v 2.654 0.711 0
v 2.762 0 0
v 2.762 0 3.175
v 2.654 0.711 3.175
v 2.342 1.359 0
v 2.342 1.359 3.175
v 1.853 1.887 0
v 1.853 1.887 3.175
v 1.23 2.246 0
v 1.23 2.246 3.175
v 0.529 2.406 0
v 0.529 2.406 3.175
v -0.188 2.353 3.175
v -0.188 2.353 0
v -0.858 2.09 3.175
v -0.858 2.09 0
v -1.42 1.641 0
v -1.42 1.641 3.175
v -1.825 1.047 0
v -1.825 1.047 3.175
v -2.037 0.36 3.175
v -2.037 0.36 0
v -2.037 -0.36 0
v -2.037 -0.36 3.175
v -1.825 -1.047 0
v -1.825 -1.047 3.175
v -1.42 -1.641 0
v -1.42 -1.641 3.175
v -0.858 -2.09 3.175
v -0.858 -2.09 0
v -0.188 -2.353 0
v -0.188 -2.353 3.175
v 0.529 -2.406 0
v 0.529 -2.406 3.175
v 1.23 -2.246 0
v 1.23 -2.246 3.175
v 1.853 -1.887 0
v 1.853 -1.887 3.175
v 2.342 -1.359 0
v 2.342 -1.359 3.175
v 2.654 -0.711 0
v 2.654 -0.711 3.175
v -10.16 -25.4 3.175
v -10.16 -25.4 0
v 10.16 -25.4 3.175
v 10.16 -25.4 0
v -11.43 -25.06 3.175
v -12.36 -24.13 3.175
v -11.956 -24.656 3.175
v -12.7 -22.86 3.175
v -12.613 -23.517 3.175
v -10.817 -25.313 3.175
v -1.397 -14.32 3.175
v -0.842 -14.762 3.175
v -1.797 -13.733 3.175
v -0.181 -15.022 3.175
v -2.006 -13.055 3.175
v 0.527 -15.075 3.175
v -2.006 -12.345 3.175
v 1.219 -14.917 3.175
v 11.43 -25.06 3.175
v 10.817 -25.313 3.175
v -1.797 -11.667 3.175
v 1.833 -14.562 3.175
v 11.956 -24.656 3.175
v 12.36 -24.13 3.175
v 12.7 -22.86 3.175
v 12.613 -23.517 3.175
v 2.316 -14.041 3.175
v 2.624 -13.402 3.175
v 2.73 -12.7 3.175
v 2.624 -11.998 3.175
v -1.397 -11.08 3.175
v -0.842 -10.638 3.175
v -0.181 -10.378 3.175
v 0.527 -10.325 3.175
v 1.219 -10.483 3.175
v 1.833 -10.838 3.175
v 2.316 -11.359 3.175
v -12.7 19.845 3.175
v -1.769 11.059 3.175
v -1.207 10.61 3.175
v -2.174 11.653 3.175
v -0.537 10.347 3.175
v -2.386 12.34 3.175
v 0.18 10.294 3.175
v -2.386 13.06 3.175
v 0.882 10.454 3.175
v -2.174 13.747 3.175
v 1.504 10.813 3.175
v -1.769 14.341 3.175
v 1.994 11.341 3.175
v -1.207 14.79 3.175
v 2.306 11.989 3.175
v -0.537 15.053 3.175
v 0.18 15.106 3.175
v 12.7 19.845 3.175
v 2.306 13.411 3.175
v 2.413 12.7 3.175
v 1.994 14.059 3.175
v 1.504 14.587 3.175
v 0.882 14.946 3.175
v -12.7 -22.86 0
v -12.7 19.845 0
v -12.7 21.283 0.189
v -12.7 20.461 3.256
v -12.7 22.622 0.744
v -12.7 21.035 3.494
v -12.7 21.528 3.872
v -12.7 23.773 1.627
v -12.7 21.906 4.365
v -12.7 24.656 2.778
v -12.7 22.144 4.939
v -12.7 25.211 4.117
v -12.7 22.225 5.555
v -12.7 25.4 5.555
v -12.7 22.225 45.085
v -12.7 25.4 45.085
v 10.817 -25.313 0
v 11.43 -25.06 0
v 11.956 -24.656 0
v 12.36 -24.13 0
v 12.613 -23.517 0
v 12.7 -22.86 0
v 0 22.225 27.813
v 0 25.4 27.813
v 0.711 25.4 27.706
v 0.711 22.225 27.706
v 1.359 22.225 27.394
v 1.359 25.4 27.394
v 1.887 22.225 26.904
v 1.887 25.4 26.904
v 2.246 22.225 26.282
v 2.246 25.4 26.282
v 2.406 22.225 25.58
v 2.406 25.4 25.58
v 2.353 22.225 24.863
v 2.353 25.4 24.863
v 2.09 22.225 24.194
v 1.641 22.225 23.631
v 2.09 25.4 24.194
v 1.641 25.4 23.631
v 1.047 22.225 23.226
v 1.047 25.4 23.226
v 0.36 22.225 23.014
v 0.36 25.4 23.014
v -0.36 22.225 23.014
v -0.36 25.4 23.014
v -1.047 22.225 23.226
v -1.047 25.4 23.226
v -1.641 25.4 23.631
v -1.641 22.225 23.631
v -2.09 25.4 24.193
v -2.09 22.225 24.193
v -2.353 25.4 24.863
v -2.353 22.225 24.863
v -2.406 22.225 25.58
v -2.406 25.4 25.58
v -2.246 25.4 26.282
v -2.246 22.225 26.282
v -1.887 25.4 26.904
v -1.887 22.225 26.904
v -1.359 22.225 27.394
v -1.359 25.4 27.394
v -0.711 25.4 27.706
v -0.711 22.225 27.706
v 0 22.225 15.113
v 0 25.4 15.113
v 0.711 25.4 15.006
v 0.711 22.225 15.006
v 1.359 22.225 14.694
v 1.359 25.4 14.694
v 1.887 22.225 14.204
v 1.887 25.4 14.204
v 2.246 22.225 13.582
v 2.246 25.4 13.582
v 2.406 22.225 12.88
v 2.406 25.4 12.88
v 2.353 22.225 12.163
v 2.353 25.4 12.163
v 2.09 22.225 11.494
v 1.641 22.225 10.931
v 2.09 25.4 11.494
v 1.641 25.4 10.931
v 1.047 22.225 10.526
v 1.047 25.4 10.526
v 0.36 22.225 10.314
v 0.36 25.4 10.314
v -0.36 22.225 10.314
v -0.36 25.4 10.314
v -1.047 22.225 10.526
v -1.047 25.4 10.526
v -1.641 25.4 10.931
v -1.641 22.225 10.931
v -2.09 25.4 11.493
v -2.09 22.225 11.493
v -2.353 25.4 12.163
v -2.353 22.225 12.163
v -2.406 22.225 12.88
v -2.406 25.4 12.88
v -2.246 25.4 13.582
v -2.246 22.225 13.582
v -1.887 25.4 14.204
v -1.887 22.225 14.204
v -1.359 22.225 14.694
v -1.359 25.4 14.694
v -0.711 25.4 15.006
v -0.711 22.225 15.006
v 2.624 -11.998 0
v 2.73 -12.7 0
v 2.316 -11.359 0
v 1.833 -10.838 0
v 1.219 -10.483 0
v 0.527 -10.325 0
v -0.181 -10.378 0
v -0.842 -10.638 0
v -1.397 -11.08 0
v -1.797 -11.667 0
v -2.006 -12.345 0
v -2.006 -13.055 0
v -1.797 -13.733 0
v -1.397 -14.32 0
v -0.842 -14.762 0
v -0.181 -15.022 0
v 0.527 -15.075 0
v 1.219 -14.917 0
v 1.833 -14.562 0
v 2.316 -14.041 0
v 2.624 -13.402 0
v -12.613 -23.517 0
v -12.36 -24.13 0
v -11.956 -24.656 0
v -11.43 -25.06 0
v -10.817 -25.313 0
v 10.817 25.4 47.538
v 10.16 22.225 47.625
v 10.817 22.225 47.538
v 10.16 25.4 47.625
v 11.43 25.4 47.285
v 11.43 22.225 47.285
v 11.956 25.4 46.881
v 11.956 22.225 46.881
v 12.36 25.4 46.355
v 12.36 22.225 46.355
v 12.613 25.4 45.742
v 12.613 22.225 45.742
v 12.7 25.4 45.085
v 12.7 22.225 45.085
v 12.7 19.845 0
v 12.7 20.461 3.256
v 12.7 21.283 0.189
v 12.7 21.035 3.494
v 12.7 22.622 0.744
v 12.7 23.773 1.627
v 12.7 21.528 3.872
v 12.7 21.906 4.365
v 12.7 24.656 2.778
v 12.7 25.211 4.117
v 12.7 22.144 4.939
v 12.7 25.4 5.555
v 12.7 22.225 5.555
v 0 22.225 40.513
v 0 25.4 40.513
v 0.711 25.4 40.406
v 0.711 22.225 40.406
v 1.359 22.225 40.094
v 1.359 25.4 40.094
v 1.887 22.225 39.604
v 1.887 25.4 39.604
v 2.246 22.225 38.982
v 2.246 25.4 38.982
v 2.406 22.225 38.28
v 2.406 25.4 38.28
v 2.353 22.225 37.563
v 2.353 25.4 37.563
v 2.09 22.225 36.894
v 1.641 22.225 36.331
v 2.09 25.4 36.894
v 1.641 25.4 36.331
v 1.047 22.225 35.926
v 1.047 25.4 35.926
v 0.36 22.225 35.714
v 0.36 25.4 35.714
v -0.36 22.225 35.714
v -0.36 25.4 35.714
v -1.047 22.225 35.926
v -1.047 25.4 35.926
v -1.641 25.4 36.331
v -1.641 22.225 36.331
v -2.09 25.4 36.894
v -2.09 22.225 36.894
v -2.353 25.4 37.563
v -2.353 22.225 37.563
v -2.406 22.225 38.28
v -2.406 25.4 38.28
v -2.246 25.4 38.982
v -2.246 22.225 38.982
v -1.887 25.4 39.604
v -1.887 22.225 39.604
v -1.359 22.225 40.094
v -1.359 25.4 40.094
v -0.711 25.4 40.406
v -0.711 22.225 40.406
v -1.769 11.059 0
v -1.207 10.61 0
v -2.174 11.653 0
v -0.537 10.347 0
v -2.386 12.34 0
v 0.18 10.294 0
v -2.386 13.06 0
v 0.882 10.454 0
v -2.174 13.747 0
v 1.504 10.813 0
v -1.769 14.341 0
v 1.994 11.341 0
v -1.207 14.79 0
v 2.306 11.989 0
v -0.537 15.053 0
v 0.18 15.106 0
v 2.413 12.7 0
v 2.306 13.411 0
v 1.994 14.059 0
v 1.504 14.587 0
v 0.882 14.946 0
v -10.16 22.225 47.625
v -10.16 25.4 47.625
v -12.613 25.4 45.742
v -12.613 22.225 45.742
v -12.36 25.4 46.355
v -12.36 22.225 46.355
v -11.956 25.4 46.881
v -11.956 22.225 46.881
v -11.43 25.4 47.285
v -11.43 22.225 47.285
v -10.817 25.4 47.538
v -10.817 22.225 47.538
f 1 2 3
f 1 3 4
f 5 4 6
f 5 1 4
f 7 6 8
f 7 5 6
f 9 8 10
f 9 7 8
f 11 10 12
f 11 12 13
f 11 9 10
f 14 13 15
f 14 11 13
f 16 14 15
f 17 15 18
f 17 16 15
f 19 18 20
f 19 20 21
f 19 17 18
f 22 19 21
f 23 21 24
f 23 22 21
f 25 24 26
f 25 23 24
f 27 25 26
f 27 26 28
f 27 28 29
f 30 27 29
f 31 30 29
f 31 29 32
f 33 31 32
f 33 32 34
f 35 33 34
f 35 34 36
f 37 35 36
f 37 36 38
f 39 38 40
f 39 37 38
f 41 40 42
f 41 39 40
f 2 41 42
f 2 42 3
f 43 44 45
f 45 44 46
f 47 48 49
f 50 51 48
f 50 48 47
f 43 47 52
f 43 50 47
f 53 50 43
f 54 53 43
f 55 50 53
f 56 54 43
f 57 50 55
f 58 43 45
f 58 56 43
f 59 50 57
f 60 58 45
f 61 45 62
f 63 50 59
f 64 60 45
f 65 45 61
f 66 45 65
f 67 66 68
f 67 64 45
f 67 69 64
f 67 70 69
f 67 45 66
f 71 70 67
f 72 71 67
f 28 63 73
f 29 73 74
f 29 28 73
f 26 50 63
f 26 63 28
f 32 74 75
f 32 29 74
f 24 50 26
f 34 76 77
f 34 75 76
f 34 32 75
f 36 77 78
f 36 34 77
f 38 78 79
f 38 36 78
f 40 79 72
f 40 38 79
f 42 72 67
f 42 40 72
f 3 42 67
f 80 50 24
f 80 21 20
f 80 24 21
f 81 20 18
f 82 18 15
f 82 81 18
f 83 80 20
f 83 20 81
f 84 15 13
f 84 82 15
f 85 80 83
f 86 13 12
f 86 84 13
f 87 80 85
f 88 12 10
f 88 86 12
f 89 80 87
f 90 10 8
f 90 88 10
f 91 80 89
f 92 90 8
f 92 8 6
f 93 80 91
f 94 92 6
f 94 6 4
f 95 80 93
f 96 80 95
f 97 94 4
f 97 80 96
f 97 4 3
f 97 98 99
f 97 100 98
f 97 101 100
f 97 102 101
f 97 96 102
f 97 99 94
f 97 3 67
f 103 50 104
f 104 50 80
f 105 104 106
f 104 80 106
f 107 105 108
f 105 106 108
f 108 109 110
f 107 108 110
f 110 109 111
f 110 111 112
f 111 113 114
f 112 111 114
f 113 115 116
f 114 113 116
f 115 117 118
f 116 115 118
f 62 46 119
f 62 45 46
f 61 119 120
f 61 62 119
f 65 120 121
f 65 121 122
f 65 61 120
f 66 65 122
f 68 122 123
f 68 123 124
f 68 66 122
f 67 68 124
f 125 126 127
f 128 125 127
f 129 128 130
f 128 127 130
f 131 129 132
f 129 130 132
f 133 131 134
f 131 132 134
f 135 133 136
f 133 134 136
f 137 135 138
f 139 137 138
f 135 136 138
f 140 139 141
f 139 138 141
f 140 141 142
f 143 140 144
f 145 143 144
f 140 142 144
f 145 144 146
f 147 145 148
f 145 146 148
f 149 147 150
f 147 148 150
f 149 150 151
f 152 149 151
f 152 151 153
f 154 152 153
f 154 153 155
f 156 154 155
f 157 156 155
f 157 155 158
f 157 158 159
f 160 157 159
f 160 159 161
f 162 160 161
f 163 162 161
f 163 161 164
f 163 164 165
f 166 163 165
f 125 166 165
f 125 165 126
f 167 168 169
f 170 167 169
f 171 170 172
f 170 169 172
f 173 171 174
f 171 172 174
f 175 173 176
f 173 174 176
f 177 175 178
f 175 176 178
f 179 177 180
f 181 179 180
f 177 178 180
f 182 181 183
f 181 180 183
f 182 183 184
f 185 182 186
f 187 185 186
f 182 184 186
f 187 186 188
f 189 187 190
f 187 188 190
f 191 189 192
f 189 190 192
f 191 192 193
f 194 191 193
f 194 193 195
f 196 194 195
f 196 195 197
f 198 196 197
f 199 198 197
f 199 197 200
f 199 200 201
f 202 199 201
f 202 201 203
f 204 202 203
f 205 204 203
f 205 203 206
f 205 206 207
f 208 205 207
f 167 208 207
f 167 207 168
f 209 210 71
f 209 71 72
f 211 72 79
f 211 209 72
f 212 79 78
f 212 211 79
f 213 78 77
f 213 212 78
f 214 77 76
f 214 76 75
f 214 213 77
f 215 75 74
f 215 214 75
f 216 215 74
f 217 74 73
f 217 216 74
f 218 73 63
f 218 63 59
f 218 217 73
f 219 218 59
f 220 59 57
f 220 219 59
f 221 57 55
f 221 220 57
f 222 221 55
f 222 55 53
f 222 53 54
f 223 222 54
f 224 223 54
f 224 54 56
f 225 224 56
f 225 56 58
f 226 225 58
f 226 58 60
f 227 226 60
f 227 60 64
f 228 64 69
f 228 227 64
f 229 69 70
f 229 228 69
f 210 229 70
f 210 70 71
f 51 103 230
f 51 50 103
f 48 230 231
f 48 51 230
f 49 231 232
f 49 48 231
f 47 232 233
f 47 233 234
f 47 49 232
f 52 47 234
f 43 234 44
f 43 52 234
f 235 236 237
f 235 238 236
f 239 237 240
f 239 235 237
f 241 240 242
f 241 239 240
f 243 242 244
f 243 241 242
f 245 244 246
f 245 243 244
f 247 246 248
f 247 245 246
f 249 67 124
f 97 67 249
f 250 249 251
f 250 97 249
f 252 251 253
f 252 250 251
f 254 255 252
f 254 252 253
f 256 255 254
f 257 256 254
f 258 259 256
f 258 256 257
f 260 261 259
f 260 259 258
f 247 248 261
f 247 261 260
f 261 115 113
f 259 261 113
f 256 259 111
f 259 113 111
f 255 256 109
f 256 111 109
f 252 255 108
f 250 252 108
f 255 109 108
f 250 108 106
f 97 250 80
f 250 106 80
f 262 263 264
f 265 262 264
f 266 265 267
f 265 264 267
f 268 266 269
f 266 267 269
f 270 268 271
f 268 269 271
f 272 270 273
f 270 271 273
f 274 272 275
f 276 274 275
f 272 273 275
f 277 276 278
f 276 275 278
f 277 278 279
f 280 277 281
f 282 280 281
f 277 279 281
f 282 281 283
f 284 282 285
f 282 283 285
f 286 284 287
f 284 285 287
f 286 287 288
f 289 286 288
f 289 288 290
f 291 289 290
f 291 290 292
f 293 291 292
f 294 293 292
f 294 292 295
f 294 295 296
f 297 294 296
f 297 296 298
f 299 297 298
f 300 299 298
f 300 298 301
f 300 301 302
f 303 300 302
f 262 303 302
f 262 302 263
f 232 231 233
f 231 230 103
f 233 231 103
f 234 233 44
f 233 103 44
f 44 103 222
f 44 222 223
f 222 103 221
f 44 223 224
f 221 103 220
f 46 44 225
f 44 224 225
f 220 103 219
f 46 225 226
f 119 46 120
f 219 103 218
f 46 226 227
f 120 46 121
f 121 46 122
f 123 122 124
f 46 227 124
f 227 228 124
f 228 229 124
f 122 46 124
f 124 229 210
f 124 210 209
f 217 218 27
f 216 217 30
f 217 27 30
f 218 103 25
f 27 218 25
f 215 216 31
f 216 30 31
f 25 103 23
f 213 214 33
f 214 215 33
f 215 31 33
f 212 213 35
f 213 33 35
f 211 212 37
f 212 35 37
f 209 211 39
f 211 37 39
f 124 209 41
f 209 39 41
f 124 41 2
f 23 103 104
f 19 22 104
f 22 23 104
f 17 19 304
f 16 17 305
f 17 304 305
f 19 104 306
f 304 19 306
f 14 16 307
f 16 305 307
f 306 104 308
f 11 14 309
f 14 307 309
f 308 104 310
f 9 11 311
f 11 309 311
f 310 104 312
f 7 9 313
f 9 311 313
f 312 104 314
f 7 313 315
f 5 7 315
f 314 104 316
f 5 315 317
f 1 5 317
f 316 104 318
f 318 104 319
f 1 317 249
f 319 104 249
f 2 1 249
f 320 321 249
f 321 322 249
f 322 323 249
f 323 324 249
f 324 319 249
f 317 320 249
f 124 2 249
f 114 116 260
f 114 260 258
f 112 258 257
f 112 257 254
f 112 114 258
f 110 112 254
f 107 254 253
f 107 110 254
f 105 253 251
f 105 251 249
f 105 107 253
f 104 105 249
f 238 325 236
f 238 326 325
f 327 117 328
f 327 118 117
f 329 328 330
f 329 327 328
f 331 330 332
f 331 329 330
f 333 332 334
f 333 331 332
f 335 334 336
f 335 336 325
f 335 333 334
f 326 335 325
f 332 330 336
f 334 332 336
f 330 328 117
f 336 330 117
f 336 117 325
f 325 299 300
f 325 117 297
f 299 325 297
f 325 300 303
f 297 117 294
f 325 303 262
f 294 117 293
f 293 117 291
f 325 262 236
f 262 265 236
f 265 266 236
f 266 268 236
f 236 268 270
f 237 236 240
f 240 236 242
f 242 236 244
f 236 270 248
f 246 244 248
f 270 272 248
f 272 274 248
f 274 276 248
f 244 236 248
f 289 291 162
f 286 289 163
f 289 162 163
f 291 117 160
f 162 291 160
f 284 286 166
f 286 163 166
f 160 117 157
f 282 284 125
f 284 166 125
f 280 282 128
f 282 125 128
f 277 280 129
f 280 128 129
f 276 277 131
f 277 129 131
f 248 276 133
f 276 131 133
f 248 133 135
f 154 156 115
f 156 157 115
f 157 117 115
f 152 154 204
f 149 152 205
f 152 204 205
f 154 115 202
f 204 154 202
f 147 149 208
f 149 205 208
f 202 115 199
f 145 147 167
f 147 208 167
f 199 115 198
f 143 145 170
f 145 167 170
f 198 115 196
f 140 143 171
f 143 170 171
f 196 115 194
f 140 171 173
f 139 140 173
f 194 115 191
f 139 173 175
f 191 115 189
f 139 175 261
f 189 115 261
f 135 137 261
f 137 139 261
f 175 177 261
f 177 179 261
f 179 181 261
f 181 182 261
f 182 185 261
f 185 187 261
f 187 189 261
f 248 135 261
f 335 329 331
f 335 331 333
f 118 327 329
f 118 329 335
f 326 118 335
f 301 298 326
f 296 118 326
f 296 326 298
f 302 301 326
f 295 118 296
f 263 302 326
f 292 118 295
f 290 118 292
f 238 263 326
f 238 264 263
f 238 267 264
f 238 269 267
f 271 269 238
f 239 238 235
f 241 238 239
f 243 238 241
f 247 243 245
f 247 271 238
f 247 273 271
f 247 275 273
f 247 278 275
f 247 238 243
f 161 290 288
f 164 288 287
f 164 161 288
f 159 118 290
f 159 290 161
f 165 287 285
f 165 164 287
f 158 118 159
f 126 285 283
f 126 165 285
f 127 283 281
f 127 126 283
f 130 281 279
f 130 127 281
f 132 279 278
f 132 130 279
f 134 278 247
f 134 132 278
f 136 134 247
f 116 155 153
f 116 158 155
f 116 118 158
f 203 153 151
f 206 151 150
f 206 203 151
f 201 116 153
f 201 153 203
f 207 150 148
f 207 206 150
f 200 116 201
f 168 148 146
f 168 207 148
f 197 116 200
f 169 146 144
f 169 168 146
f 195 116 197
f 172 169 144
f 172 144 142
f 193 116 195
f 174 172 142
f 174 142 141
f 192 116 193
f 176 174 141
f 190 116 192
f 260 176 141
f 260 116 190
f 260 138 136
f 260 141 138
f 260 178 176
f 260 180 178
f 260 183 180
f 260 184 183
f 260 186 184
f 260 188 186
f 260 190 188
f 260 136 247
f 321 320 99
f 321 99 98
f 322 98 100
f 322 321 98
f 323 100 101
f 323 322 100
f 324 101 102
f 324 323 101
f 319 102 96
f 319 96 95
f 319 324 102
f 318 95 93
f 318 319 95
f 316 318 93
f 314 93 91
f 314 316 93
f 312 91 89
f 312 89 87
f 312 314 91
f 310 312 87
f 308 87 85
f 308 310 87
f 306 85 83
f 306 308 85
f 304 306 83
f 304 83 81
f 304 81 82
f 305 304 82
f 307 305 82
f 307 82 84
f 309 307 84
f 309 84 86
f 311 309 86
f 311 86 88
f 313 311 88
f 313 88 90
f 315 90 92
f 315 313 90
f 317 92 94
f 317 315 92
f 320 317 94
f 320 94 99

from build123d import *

# Parameters (mm, degrees)
SKETCH1_W              = 25.4
SKETCH1_H              = 50.8
SKETCH1_R              = 2.413
SKETCH1_R_2            = 2.38125
BOSS_EXTRUDE1_DEPTH    = 3.175
SKETCH2_W              = 25.4
SKETCH2_H              = 3.175
BOSS_EXTRUDE2_DEPTH    = 44.45
SKETCH3_R              = 2.413
CUT_EXTRUDE1_DEPTH     = 44.45
FILLET1_R              = 2.54
CONVERT_SOLID1_START   = -12.7
CONVERT_SOLID1_DEPTH   = 25.4
CONVERT_SOLID1_2_DEPTH = 25.4


# Read off the part's stored shape, not the designer's step: Convert-Solid1
with BuildPart() as part:
    # Sketch1 → Boss-Extrude1 (new body)
    with BuildSketch(Plane.XY):
        Rectangle(SKETCH1_W, SKETCH1_H)
        with Locations((0, 12.7)):
            Circle(SKETCH1_R, mode=Mode.SUBTRACT)
        with Locations((0.348627451, 0)):
            Circle(SKETCH1_R, mode=Mode.SUBTRACT)
        with Locations((0.348627451, -12.7)):
            Circle(SKETCH1_R_2, mode=Mode.SUBTRACT)
    extrude(amount=BOSS_EXTRUDE1_DEPTH)

    # Sketch2 → Boss-Extrude2 (add)
    with BuildSketch(Plane.XY.offset(3.175)):
        with Locations((0, 23.8125)):
            Rectangle(SKETCH2_W, SKETCH2_H)
    extrude(amount=BOSS_EXTRUDE2_DEPTH)

    # Sketch3 → Cut-Extrude1 (cut)
    with BuildSketch(Plane(origin=(0, 25.4, 0), x_dir=(1, 0, 0), z_dir=(0, 1, 0))):
        with Locations(Location((0, -12.7, 0), (0, 0, 270))):
            Circle(SKETCH3_R)
        with Locations(Location((0, -25.4, 0), (0, 0, 270))):
            Circle(SKETCH3_R)
        with Locations(Location((0, -38.1, 0), (0, 0, 270))):
            Circle(SKETCH3_R)
    extrude(amount=-CUT_EXTRUDE1_DEPTH, mode=Mode.SUBTRACT)

    # Fillet1
    fillet1_edges = [part.edges().sort_by_distance(p)[0] for p in [
        (-12.7, 23.8125, 47.625),
        (12.7, 23.8125, 47.625),
        (12.7, -25.4, 1.5875),
        (-12.7, -25.4, 1.5875),
    ]]
    fillet(fillet1_edges, radius=FILLET1_R)

    # Convert-Solid1 outline → Convert-Solid1 (cut)
    with BuildSketch(Plane.YZ.offset(CONVERT_SOLID1_START)):
        with BuildLine():
            Line((25.4, 0), (25.4, 5.555000066))
            ThreePointArc((25.4, 5.555000066), (23.77297815, 1.62702185), (19.844999934, 0))
            Line((19.844999934, 0), (25.4, 0))
        make_face()
    extrude(amount=CONVERT_SOLID1_DEPTH, mode=Mode.SUBTRACT)

    # Convert-Solid1 2 outline → Convert-Solid1 2 (add)
    with BuildSketch(Plane.YZ.offset(CONVERT_SOLID1_START)):
        with BuildLine():
            Line((22.225, 3.175), (22.225, 5.555000066))
            ThreePointArc((22.225, 5.555000066), (21.52791412, 3.87208588), (19.844999934, 3.175))
            Line((19.844999934, 3.175), (22.225, 3.175))
        make_face()
    extrude(amount=CONVERT_SOLID1_2_DEPTH)


solid = part.part
